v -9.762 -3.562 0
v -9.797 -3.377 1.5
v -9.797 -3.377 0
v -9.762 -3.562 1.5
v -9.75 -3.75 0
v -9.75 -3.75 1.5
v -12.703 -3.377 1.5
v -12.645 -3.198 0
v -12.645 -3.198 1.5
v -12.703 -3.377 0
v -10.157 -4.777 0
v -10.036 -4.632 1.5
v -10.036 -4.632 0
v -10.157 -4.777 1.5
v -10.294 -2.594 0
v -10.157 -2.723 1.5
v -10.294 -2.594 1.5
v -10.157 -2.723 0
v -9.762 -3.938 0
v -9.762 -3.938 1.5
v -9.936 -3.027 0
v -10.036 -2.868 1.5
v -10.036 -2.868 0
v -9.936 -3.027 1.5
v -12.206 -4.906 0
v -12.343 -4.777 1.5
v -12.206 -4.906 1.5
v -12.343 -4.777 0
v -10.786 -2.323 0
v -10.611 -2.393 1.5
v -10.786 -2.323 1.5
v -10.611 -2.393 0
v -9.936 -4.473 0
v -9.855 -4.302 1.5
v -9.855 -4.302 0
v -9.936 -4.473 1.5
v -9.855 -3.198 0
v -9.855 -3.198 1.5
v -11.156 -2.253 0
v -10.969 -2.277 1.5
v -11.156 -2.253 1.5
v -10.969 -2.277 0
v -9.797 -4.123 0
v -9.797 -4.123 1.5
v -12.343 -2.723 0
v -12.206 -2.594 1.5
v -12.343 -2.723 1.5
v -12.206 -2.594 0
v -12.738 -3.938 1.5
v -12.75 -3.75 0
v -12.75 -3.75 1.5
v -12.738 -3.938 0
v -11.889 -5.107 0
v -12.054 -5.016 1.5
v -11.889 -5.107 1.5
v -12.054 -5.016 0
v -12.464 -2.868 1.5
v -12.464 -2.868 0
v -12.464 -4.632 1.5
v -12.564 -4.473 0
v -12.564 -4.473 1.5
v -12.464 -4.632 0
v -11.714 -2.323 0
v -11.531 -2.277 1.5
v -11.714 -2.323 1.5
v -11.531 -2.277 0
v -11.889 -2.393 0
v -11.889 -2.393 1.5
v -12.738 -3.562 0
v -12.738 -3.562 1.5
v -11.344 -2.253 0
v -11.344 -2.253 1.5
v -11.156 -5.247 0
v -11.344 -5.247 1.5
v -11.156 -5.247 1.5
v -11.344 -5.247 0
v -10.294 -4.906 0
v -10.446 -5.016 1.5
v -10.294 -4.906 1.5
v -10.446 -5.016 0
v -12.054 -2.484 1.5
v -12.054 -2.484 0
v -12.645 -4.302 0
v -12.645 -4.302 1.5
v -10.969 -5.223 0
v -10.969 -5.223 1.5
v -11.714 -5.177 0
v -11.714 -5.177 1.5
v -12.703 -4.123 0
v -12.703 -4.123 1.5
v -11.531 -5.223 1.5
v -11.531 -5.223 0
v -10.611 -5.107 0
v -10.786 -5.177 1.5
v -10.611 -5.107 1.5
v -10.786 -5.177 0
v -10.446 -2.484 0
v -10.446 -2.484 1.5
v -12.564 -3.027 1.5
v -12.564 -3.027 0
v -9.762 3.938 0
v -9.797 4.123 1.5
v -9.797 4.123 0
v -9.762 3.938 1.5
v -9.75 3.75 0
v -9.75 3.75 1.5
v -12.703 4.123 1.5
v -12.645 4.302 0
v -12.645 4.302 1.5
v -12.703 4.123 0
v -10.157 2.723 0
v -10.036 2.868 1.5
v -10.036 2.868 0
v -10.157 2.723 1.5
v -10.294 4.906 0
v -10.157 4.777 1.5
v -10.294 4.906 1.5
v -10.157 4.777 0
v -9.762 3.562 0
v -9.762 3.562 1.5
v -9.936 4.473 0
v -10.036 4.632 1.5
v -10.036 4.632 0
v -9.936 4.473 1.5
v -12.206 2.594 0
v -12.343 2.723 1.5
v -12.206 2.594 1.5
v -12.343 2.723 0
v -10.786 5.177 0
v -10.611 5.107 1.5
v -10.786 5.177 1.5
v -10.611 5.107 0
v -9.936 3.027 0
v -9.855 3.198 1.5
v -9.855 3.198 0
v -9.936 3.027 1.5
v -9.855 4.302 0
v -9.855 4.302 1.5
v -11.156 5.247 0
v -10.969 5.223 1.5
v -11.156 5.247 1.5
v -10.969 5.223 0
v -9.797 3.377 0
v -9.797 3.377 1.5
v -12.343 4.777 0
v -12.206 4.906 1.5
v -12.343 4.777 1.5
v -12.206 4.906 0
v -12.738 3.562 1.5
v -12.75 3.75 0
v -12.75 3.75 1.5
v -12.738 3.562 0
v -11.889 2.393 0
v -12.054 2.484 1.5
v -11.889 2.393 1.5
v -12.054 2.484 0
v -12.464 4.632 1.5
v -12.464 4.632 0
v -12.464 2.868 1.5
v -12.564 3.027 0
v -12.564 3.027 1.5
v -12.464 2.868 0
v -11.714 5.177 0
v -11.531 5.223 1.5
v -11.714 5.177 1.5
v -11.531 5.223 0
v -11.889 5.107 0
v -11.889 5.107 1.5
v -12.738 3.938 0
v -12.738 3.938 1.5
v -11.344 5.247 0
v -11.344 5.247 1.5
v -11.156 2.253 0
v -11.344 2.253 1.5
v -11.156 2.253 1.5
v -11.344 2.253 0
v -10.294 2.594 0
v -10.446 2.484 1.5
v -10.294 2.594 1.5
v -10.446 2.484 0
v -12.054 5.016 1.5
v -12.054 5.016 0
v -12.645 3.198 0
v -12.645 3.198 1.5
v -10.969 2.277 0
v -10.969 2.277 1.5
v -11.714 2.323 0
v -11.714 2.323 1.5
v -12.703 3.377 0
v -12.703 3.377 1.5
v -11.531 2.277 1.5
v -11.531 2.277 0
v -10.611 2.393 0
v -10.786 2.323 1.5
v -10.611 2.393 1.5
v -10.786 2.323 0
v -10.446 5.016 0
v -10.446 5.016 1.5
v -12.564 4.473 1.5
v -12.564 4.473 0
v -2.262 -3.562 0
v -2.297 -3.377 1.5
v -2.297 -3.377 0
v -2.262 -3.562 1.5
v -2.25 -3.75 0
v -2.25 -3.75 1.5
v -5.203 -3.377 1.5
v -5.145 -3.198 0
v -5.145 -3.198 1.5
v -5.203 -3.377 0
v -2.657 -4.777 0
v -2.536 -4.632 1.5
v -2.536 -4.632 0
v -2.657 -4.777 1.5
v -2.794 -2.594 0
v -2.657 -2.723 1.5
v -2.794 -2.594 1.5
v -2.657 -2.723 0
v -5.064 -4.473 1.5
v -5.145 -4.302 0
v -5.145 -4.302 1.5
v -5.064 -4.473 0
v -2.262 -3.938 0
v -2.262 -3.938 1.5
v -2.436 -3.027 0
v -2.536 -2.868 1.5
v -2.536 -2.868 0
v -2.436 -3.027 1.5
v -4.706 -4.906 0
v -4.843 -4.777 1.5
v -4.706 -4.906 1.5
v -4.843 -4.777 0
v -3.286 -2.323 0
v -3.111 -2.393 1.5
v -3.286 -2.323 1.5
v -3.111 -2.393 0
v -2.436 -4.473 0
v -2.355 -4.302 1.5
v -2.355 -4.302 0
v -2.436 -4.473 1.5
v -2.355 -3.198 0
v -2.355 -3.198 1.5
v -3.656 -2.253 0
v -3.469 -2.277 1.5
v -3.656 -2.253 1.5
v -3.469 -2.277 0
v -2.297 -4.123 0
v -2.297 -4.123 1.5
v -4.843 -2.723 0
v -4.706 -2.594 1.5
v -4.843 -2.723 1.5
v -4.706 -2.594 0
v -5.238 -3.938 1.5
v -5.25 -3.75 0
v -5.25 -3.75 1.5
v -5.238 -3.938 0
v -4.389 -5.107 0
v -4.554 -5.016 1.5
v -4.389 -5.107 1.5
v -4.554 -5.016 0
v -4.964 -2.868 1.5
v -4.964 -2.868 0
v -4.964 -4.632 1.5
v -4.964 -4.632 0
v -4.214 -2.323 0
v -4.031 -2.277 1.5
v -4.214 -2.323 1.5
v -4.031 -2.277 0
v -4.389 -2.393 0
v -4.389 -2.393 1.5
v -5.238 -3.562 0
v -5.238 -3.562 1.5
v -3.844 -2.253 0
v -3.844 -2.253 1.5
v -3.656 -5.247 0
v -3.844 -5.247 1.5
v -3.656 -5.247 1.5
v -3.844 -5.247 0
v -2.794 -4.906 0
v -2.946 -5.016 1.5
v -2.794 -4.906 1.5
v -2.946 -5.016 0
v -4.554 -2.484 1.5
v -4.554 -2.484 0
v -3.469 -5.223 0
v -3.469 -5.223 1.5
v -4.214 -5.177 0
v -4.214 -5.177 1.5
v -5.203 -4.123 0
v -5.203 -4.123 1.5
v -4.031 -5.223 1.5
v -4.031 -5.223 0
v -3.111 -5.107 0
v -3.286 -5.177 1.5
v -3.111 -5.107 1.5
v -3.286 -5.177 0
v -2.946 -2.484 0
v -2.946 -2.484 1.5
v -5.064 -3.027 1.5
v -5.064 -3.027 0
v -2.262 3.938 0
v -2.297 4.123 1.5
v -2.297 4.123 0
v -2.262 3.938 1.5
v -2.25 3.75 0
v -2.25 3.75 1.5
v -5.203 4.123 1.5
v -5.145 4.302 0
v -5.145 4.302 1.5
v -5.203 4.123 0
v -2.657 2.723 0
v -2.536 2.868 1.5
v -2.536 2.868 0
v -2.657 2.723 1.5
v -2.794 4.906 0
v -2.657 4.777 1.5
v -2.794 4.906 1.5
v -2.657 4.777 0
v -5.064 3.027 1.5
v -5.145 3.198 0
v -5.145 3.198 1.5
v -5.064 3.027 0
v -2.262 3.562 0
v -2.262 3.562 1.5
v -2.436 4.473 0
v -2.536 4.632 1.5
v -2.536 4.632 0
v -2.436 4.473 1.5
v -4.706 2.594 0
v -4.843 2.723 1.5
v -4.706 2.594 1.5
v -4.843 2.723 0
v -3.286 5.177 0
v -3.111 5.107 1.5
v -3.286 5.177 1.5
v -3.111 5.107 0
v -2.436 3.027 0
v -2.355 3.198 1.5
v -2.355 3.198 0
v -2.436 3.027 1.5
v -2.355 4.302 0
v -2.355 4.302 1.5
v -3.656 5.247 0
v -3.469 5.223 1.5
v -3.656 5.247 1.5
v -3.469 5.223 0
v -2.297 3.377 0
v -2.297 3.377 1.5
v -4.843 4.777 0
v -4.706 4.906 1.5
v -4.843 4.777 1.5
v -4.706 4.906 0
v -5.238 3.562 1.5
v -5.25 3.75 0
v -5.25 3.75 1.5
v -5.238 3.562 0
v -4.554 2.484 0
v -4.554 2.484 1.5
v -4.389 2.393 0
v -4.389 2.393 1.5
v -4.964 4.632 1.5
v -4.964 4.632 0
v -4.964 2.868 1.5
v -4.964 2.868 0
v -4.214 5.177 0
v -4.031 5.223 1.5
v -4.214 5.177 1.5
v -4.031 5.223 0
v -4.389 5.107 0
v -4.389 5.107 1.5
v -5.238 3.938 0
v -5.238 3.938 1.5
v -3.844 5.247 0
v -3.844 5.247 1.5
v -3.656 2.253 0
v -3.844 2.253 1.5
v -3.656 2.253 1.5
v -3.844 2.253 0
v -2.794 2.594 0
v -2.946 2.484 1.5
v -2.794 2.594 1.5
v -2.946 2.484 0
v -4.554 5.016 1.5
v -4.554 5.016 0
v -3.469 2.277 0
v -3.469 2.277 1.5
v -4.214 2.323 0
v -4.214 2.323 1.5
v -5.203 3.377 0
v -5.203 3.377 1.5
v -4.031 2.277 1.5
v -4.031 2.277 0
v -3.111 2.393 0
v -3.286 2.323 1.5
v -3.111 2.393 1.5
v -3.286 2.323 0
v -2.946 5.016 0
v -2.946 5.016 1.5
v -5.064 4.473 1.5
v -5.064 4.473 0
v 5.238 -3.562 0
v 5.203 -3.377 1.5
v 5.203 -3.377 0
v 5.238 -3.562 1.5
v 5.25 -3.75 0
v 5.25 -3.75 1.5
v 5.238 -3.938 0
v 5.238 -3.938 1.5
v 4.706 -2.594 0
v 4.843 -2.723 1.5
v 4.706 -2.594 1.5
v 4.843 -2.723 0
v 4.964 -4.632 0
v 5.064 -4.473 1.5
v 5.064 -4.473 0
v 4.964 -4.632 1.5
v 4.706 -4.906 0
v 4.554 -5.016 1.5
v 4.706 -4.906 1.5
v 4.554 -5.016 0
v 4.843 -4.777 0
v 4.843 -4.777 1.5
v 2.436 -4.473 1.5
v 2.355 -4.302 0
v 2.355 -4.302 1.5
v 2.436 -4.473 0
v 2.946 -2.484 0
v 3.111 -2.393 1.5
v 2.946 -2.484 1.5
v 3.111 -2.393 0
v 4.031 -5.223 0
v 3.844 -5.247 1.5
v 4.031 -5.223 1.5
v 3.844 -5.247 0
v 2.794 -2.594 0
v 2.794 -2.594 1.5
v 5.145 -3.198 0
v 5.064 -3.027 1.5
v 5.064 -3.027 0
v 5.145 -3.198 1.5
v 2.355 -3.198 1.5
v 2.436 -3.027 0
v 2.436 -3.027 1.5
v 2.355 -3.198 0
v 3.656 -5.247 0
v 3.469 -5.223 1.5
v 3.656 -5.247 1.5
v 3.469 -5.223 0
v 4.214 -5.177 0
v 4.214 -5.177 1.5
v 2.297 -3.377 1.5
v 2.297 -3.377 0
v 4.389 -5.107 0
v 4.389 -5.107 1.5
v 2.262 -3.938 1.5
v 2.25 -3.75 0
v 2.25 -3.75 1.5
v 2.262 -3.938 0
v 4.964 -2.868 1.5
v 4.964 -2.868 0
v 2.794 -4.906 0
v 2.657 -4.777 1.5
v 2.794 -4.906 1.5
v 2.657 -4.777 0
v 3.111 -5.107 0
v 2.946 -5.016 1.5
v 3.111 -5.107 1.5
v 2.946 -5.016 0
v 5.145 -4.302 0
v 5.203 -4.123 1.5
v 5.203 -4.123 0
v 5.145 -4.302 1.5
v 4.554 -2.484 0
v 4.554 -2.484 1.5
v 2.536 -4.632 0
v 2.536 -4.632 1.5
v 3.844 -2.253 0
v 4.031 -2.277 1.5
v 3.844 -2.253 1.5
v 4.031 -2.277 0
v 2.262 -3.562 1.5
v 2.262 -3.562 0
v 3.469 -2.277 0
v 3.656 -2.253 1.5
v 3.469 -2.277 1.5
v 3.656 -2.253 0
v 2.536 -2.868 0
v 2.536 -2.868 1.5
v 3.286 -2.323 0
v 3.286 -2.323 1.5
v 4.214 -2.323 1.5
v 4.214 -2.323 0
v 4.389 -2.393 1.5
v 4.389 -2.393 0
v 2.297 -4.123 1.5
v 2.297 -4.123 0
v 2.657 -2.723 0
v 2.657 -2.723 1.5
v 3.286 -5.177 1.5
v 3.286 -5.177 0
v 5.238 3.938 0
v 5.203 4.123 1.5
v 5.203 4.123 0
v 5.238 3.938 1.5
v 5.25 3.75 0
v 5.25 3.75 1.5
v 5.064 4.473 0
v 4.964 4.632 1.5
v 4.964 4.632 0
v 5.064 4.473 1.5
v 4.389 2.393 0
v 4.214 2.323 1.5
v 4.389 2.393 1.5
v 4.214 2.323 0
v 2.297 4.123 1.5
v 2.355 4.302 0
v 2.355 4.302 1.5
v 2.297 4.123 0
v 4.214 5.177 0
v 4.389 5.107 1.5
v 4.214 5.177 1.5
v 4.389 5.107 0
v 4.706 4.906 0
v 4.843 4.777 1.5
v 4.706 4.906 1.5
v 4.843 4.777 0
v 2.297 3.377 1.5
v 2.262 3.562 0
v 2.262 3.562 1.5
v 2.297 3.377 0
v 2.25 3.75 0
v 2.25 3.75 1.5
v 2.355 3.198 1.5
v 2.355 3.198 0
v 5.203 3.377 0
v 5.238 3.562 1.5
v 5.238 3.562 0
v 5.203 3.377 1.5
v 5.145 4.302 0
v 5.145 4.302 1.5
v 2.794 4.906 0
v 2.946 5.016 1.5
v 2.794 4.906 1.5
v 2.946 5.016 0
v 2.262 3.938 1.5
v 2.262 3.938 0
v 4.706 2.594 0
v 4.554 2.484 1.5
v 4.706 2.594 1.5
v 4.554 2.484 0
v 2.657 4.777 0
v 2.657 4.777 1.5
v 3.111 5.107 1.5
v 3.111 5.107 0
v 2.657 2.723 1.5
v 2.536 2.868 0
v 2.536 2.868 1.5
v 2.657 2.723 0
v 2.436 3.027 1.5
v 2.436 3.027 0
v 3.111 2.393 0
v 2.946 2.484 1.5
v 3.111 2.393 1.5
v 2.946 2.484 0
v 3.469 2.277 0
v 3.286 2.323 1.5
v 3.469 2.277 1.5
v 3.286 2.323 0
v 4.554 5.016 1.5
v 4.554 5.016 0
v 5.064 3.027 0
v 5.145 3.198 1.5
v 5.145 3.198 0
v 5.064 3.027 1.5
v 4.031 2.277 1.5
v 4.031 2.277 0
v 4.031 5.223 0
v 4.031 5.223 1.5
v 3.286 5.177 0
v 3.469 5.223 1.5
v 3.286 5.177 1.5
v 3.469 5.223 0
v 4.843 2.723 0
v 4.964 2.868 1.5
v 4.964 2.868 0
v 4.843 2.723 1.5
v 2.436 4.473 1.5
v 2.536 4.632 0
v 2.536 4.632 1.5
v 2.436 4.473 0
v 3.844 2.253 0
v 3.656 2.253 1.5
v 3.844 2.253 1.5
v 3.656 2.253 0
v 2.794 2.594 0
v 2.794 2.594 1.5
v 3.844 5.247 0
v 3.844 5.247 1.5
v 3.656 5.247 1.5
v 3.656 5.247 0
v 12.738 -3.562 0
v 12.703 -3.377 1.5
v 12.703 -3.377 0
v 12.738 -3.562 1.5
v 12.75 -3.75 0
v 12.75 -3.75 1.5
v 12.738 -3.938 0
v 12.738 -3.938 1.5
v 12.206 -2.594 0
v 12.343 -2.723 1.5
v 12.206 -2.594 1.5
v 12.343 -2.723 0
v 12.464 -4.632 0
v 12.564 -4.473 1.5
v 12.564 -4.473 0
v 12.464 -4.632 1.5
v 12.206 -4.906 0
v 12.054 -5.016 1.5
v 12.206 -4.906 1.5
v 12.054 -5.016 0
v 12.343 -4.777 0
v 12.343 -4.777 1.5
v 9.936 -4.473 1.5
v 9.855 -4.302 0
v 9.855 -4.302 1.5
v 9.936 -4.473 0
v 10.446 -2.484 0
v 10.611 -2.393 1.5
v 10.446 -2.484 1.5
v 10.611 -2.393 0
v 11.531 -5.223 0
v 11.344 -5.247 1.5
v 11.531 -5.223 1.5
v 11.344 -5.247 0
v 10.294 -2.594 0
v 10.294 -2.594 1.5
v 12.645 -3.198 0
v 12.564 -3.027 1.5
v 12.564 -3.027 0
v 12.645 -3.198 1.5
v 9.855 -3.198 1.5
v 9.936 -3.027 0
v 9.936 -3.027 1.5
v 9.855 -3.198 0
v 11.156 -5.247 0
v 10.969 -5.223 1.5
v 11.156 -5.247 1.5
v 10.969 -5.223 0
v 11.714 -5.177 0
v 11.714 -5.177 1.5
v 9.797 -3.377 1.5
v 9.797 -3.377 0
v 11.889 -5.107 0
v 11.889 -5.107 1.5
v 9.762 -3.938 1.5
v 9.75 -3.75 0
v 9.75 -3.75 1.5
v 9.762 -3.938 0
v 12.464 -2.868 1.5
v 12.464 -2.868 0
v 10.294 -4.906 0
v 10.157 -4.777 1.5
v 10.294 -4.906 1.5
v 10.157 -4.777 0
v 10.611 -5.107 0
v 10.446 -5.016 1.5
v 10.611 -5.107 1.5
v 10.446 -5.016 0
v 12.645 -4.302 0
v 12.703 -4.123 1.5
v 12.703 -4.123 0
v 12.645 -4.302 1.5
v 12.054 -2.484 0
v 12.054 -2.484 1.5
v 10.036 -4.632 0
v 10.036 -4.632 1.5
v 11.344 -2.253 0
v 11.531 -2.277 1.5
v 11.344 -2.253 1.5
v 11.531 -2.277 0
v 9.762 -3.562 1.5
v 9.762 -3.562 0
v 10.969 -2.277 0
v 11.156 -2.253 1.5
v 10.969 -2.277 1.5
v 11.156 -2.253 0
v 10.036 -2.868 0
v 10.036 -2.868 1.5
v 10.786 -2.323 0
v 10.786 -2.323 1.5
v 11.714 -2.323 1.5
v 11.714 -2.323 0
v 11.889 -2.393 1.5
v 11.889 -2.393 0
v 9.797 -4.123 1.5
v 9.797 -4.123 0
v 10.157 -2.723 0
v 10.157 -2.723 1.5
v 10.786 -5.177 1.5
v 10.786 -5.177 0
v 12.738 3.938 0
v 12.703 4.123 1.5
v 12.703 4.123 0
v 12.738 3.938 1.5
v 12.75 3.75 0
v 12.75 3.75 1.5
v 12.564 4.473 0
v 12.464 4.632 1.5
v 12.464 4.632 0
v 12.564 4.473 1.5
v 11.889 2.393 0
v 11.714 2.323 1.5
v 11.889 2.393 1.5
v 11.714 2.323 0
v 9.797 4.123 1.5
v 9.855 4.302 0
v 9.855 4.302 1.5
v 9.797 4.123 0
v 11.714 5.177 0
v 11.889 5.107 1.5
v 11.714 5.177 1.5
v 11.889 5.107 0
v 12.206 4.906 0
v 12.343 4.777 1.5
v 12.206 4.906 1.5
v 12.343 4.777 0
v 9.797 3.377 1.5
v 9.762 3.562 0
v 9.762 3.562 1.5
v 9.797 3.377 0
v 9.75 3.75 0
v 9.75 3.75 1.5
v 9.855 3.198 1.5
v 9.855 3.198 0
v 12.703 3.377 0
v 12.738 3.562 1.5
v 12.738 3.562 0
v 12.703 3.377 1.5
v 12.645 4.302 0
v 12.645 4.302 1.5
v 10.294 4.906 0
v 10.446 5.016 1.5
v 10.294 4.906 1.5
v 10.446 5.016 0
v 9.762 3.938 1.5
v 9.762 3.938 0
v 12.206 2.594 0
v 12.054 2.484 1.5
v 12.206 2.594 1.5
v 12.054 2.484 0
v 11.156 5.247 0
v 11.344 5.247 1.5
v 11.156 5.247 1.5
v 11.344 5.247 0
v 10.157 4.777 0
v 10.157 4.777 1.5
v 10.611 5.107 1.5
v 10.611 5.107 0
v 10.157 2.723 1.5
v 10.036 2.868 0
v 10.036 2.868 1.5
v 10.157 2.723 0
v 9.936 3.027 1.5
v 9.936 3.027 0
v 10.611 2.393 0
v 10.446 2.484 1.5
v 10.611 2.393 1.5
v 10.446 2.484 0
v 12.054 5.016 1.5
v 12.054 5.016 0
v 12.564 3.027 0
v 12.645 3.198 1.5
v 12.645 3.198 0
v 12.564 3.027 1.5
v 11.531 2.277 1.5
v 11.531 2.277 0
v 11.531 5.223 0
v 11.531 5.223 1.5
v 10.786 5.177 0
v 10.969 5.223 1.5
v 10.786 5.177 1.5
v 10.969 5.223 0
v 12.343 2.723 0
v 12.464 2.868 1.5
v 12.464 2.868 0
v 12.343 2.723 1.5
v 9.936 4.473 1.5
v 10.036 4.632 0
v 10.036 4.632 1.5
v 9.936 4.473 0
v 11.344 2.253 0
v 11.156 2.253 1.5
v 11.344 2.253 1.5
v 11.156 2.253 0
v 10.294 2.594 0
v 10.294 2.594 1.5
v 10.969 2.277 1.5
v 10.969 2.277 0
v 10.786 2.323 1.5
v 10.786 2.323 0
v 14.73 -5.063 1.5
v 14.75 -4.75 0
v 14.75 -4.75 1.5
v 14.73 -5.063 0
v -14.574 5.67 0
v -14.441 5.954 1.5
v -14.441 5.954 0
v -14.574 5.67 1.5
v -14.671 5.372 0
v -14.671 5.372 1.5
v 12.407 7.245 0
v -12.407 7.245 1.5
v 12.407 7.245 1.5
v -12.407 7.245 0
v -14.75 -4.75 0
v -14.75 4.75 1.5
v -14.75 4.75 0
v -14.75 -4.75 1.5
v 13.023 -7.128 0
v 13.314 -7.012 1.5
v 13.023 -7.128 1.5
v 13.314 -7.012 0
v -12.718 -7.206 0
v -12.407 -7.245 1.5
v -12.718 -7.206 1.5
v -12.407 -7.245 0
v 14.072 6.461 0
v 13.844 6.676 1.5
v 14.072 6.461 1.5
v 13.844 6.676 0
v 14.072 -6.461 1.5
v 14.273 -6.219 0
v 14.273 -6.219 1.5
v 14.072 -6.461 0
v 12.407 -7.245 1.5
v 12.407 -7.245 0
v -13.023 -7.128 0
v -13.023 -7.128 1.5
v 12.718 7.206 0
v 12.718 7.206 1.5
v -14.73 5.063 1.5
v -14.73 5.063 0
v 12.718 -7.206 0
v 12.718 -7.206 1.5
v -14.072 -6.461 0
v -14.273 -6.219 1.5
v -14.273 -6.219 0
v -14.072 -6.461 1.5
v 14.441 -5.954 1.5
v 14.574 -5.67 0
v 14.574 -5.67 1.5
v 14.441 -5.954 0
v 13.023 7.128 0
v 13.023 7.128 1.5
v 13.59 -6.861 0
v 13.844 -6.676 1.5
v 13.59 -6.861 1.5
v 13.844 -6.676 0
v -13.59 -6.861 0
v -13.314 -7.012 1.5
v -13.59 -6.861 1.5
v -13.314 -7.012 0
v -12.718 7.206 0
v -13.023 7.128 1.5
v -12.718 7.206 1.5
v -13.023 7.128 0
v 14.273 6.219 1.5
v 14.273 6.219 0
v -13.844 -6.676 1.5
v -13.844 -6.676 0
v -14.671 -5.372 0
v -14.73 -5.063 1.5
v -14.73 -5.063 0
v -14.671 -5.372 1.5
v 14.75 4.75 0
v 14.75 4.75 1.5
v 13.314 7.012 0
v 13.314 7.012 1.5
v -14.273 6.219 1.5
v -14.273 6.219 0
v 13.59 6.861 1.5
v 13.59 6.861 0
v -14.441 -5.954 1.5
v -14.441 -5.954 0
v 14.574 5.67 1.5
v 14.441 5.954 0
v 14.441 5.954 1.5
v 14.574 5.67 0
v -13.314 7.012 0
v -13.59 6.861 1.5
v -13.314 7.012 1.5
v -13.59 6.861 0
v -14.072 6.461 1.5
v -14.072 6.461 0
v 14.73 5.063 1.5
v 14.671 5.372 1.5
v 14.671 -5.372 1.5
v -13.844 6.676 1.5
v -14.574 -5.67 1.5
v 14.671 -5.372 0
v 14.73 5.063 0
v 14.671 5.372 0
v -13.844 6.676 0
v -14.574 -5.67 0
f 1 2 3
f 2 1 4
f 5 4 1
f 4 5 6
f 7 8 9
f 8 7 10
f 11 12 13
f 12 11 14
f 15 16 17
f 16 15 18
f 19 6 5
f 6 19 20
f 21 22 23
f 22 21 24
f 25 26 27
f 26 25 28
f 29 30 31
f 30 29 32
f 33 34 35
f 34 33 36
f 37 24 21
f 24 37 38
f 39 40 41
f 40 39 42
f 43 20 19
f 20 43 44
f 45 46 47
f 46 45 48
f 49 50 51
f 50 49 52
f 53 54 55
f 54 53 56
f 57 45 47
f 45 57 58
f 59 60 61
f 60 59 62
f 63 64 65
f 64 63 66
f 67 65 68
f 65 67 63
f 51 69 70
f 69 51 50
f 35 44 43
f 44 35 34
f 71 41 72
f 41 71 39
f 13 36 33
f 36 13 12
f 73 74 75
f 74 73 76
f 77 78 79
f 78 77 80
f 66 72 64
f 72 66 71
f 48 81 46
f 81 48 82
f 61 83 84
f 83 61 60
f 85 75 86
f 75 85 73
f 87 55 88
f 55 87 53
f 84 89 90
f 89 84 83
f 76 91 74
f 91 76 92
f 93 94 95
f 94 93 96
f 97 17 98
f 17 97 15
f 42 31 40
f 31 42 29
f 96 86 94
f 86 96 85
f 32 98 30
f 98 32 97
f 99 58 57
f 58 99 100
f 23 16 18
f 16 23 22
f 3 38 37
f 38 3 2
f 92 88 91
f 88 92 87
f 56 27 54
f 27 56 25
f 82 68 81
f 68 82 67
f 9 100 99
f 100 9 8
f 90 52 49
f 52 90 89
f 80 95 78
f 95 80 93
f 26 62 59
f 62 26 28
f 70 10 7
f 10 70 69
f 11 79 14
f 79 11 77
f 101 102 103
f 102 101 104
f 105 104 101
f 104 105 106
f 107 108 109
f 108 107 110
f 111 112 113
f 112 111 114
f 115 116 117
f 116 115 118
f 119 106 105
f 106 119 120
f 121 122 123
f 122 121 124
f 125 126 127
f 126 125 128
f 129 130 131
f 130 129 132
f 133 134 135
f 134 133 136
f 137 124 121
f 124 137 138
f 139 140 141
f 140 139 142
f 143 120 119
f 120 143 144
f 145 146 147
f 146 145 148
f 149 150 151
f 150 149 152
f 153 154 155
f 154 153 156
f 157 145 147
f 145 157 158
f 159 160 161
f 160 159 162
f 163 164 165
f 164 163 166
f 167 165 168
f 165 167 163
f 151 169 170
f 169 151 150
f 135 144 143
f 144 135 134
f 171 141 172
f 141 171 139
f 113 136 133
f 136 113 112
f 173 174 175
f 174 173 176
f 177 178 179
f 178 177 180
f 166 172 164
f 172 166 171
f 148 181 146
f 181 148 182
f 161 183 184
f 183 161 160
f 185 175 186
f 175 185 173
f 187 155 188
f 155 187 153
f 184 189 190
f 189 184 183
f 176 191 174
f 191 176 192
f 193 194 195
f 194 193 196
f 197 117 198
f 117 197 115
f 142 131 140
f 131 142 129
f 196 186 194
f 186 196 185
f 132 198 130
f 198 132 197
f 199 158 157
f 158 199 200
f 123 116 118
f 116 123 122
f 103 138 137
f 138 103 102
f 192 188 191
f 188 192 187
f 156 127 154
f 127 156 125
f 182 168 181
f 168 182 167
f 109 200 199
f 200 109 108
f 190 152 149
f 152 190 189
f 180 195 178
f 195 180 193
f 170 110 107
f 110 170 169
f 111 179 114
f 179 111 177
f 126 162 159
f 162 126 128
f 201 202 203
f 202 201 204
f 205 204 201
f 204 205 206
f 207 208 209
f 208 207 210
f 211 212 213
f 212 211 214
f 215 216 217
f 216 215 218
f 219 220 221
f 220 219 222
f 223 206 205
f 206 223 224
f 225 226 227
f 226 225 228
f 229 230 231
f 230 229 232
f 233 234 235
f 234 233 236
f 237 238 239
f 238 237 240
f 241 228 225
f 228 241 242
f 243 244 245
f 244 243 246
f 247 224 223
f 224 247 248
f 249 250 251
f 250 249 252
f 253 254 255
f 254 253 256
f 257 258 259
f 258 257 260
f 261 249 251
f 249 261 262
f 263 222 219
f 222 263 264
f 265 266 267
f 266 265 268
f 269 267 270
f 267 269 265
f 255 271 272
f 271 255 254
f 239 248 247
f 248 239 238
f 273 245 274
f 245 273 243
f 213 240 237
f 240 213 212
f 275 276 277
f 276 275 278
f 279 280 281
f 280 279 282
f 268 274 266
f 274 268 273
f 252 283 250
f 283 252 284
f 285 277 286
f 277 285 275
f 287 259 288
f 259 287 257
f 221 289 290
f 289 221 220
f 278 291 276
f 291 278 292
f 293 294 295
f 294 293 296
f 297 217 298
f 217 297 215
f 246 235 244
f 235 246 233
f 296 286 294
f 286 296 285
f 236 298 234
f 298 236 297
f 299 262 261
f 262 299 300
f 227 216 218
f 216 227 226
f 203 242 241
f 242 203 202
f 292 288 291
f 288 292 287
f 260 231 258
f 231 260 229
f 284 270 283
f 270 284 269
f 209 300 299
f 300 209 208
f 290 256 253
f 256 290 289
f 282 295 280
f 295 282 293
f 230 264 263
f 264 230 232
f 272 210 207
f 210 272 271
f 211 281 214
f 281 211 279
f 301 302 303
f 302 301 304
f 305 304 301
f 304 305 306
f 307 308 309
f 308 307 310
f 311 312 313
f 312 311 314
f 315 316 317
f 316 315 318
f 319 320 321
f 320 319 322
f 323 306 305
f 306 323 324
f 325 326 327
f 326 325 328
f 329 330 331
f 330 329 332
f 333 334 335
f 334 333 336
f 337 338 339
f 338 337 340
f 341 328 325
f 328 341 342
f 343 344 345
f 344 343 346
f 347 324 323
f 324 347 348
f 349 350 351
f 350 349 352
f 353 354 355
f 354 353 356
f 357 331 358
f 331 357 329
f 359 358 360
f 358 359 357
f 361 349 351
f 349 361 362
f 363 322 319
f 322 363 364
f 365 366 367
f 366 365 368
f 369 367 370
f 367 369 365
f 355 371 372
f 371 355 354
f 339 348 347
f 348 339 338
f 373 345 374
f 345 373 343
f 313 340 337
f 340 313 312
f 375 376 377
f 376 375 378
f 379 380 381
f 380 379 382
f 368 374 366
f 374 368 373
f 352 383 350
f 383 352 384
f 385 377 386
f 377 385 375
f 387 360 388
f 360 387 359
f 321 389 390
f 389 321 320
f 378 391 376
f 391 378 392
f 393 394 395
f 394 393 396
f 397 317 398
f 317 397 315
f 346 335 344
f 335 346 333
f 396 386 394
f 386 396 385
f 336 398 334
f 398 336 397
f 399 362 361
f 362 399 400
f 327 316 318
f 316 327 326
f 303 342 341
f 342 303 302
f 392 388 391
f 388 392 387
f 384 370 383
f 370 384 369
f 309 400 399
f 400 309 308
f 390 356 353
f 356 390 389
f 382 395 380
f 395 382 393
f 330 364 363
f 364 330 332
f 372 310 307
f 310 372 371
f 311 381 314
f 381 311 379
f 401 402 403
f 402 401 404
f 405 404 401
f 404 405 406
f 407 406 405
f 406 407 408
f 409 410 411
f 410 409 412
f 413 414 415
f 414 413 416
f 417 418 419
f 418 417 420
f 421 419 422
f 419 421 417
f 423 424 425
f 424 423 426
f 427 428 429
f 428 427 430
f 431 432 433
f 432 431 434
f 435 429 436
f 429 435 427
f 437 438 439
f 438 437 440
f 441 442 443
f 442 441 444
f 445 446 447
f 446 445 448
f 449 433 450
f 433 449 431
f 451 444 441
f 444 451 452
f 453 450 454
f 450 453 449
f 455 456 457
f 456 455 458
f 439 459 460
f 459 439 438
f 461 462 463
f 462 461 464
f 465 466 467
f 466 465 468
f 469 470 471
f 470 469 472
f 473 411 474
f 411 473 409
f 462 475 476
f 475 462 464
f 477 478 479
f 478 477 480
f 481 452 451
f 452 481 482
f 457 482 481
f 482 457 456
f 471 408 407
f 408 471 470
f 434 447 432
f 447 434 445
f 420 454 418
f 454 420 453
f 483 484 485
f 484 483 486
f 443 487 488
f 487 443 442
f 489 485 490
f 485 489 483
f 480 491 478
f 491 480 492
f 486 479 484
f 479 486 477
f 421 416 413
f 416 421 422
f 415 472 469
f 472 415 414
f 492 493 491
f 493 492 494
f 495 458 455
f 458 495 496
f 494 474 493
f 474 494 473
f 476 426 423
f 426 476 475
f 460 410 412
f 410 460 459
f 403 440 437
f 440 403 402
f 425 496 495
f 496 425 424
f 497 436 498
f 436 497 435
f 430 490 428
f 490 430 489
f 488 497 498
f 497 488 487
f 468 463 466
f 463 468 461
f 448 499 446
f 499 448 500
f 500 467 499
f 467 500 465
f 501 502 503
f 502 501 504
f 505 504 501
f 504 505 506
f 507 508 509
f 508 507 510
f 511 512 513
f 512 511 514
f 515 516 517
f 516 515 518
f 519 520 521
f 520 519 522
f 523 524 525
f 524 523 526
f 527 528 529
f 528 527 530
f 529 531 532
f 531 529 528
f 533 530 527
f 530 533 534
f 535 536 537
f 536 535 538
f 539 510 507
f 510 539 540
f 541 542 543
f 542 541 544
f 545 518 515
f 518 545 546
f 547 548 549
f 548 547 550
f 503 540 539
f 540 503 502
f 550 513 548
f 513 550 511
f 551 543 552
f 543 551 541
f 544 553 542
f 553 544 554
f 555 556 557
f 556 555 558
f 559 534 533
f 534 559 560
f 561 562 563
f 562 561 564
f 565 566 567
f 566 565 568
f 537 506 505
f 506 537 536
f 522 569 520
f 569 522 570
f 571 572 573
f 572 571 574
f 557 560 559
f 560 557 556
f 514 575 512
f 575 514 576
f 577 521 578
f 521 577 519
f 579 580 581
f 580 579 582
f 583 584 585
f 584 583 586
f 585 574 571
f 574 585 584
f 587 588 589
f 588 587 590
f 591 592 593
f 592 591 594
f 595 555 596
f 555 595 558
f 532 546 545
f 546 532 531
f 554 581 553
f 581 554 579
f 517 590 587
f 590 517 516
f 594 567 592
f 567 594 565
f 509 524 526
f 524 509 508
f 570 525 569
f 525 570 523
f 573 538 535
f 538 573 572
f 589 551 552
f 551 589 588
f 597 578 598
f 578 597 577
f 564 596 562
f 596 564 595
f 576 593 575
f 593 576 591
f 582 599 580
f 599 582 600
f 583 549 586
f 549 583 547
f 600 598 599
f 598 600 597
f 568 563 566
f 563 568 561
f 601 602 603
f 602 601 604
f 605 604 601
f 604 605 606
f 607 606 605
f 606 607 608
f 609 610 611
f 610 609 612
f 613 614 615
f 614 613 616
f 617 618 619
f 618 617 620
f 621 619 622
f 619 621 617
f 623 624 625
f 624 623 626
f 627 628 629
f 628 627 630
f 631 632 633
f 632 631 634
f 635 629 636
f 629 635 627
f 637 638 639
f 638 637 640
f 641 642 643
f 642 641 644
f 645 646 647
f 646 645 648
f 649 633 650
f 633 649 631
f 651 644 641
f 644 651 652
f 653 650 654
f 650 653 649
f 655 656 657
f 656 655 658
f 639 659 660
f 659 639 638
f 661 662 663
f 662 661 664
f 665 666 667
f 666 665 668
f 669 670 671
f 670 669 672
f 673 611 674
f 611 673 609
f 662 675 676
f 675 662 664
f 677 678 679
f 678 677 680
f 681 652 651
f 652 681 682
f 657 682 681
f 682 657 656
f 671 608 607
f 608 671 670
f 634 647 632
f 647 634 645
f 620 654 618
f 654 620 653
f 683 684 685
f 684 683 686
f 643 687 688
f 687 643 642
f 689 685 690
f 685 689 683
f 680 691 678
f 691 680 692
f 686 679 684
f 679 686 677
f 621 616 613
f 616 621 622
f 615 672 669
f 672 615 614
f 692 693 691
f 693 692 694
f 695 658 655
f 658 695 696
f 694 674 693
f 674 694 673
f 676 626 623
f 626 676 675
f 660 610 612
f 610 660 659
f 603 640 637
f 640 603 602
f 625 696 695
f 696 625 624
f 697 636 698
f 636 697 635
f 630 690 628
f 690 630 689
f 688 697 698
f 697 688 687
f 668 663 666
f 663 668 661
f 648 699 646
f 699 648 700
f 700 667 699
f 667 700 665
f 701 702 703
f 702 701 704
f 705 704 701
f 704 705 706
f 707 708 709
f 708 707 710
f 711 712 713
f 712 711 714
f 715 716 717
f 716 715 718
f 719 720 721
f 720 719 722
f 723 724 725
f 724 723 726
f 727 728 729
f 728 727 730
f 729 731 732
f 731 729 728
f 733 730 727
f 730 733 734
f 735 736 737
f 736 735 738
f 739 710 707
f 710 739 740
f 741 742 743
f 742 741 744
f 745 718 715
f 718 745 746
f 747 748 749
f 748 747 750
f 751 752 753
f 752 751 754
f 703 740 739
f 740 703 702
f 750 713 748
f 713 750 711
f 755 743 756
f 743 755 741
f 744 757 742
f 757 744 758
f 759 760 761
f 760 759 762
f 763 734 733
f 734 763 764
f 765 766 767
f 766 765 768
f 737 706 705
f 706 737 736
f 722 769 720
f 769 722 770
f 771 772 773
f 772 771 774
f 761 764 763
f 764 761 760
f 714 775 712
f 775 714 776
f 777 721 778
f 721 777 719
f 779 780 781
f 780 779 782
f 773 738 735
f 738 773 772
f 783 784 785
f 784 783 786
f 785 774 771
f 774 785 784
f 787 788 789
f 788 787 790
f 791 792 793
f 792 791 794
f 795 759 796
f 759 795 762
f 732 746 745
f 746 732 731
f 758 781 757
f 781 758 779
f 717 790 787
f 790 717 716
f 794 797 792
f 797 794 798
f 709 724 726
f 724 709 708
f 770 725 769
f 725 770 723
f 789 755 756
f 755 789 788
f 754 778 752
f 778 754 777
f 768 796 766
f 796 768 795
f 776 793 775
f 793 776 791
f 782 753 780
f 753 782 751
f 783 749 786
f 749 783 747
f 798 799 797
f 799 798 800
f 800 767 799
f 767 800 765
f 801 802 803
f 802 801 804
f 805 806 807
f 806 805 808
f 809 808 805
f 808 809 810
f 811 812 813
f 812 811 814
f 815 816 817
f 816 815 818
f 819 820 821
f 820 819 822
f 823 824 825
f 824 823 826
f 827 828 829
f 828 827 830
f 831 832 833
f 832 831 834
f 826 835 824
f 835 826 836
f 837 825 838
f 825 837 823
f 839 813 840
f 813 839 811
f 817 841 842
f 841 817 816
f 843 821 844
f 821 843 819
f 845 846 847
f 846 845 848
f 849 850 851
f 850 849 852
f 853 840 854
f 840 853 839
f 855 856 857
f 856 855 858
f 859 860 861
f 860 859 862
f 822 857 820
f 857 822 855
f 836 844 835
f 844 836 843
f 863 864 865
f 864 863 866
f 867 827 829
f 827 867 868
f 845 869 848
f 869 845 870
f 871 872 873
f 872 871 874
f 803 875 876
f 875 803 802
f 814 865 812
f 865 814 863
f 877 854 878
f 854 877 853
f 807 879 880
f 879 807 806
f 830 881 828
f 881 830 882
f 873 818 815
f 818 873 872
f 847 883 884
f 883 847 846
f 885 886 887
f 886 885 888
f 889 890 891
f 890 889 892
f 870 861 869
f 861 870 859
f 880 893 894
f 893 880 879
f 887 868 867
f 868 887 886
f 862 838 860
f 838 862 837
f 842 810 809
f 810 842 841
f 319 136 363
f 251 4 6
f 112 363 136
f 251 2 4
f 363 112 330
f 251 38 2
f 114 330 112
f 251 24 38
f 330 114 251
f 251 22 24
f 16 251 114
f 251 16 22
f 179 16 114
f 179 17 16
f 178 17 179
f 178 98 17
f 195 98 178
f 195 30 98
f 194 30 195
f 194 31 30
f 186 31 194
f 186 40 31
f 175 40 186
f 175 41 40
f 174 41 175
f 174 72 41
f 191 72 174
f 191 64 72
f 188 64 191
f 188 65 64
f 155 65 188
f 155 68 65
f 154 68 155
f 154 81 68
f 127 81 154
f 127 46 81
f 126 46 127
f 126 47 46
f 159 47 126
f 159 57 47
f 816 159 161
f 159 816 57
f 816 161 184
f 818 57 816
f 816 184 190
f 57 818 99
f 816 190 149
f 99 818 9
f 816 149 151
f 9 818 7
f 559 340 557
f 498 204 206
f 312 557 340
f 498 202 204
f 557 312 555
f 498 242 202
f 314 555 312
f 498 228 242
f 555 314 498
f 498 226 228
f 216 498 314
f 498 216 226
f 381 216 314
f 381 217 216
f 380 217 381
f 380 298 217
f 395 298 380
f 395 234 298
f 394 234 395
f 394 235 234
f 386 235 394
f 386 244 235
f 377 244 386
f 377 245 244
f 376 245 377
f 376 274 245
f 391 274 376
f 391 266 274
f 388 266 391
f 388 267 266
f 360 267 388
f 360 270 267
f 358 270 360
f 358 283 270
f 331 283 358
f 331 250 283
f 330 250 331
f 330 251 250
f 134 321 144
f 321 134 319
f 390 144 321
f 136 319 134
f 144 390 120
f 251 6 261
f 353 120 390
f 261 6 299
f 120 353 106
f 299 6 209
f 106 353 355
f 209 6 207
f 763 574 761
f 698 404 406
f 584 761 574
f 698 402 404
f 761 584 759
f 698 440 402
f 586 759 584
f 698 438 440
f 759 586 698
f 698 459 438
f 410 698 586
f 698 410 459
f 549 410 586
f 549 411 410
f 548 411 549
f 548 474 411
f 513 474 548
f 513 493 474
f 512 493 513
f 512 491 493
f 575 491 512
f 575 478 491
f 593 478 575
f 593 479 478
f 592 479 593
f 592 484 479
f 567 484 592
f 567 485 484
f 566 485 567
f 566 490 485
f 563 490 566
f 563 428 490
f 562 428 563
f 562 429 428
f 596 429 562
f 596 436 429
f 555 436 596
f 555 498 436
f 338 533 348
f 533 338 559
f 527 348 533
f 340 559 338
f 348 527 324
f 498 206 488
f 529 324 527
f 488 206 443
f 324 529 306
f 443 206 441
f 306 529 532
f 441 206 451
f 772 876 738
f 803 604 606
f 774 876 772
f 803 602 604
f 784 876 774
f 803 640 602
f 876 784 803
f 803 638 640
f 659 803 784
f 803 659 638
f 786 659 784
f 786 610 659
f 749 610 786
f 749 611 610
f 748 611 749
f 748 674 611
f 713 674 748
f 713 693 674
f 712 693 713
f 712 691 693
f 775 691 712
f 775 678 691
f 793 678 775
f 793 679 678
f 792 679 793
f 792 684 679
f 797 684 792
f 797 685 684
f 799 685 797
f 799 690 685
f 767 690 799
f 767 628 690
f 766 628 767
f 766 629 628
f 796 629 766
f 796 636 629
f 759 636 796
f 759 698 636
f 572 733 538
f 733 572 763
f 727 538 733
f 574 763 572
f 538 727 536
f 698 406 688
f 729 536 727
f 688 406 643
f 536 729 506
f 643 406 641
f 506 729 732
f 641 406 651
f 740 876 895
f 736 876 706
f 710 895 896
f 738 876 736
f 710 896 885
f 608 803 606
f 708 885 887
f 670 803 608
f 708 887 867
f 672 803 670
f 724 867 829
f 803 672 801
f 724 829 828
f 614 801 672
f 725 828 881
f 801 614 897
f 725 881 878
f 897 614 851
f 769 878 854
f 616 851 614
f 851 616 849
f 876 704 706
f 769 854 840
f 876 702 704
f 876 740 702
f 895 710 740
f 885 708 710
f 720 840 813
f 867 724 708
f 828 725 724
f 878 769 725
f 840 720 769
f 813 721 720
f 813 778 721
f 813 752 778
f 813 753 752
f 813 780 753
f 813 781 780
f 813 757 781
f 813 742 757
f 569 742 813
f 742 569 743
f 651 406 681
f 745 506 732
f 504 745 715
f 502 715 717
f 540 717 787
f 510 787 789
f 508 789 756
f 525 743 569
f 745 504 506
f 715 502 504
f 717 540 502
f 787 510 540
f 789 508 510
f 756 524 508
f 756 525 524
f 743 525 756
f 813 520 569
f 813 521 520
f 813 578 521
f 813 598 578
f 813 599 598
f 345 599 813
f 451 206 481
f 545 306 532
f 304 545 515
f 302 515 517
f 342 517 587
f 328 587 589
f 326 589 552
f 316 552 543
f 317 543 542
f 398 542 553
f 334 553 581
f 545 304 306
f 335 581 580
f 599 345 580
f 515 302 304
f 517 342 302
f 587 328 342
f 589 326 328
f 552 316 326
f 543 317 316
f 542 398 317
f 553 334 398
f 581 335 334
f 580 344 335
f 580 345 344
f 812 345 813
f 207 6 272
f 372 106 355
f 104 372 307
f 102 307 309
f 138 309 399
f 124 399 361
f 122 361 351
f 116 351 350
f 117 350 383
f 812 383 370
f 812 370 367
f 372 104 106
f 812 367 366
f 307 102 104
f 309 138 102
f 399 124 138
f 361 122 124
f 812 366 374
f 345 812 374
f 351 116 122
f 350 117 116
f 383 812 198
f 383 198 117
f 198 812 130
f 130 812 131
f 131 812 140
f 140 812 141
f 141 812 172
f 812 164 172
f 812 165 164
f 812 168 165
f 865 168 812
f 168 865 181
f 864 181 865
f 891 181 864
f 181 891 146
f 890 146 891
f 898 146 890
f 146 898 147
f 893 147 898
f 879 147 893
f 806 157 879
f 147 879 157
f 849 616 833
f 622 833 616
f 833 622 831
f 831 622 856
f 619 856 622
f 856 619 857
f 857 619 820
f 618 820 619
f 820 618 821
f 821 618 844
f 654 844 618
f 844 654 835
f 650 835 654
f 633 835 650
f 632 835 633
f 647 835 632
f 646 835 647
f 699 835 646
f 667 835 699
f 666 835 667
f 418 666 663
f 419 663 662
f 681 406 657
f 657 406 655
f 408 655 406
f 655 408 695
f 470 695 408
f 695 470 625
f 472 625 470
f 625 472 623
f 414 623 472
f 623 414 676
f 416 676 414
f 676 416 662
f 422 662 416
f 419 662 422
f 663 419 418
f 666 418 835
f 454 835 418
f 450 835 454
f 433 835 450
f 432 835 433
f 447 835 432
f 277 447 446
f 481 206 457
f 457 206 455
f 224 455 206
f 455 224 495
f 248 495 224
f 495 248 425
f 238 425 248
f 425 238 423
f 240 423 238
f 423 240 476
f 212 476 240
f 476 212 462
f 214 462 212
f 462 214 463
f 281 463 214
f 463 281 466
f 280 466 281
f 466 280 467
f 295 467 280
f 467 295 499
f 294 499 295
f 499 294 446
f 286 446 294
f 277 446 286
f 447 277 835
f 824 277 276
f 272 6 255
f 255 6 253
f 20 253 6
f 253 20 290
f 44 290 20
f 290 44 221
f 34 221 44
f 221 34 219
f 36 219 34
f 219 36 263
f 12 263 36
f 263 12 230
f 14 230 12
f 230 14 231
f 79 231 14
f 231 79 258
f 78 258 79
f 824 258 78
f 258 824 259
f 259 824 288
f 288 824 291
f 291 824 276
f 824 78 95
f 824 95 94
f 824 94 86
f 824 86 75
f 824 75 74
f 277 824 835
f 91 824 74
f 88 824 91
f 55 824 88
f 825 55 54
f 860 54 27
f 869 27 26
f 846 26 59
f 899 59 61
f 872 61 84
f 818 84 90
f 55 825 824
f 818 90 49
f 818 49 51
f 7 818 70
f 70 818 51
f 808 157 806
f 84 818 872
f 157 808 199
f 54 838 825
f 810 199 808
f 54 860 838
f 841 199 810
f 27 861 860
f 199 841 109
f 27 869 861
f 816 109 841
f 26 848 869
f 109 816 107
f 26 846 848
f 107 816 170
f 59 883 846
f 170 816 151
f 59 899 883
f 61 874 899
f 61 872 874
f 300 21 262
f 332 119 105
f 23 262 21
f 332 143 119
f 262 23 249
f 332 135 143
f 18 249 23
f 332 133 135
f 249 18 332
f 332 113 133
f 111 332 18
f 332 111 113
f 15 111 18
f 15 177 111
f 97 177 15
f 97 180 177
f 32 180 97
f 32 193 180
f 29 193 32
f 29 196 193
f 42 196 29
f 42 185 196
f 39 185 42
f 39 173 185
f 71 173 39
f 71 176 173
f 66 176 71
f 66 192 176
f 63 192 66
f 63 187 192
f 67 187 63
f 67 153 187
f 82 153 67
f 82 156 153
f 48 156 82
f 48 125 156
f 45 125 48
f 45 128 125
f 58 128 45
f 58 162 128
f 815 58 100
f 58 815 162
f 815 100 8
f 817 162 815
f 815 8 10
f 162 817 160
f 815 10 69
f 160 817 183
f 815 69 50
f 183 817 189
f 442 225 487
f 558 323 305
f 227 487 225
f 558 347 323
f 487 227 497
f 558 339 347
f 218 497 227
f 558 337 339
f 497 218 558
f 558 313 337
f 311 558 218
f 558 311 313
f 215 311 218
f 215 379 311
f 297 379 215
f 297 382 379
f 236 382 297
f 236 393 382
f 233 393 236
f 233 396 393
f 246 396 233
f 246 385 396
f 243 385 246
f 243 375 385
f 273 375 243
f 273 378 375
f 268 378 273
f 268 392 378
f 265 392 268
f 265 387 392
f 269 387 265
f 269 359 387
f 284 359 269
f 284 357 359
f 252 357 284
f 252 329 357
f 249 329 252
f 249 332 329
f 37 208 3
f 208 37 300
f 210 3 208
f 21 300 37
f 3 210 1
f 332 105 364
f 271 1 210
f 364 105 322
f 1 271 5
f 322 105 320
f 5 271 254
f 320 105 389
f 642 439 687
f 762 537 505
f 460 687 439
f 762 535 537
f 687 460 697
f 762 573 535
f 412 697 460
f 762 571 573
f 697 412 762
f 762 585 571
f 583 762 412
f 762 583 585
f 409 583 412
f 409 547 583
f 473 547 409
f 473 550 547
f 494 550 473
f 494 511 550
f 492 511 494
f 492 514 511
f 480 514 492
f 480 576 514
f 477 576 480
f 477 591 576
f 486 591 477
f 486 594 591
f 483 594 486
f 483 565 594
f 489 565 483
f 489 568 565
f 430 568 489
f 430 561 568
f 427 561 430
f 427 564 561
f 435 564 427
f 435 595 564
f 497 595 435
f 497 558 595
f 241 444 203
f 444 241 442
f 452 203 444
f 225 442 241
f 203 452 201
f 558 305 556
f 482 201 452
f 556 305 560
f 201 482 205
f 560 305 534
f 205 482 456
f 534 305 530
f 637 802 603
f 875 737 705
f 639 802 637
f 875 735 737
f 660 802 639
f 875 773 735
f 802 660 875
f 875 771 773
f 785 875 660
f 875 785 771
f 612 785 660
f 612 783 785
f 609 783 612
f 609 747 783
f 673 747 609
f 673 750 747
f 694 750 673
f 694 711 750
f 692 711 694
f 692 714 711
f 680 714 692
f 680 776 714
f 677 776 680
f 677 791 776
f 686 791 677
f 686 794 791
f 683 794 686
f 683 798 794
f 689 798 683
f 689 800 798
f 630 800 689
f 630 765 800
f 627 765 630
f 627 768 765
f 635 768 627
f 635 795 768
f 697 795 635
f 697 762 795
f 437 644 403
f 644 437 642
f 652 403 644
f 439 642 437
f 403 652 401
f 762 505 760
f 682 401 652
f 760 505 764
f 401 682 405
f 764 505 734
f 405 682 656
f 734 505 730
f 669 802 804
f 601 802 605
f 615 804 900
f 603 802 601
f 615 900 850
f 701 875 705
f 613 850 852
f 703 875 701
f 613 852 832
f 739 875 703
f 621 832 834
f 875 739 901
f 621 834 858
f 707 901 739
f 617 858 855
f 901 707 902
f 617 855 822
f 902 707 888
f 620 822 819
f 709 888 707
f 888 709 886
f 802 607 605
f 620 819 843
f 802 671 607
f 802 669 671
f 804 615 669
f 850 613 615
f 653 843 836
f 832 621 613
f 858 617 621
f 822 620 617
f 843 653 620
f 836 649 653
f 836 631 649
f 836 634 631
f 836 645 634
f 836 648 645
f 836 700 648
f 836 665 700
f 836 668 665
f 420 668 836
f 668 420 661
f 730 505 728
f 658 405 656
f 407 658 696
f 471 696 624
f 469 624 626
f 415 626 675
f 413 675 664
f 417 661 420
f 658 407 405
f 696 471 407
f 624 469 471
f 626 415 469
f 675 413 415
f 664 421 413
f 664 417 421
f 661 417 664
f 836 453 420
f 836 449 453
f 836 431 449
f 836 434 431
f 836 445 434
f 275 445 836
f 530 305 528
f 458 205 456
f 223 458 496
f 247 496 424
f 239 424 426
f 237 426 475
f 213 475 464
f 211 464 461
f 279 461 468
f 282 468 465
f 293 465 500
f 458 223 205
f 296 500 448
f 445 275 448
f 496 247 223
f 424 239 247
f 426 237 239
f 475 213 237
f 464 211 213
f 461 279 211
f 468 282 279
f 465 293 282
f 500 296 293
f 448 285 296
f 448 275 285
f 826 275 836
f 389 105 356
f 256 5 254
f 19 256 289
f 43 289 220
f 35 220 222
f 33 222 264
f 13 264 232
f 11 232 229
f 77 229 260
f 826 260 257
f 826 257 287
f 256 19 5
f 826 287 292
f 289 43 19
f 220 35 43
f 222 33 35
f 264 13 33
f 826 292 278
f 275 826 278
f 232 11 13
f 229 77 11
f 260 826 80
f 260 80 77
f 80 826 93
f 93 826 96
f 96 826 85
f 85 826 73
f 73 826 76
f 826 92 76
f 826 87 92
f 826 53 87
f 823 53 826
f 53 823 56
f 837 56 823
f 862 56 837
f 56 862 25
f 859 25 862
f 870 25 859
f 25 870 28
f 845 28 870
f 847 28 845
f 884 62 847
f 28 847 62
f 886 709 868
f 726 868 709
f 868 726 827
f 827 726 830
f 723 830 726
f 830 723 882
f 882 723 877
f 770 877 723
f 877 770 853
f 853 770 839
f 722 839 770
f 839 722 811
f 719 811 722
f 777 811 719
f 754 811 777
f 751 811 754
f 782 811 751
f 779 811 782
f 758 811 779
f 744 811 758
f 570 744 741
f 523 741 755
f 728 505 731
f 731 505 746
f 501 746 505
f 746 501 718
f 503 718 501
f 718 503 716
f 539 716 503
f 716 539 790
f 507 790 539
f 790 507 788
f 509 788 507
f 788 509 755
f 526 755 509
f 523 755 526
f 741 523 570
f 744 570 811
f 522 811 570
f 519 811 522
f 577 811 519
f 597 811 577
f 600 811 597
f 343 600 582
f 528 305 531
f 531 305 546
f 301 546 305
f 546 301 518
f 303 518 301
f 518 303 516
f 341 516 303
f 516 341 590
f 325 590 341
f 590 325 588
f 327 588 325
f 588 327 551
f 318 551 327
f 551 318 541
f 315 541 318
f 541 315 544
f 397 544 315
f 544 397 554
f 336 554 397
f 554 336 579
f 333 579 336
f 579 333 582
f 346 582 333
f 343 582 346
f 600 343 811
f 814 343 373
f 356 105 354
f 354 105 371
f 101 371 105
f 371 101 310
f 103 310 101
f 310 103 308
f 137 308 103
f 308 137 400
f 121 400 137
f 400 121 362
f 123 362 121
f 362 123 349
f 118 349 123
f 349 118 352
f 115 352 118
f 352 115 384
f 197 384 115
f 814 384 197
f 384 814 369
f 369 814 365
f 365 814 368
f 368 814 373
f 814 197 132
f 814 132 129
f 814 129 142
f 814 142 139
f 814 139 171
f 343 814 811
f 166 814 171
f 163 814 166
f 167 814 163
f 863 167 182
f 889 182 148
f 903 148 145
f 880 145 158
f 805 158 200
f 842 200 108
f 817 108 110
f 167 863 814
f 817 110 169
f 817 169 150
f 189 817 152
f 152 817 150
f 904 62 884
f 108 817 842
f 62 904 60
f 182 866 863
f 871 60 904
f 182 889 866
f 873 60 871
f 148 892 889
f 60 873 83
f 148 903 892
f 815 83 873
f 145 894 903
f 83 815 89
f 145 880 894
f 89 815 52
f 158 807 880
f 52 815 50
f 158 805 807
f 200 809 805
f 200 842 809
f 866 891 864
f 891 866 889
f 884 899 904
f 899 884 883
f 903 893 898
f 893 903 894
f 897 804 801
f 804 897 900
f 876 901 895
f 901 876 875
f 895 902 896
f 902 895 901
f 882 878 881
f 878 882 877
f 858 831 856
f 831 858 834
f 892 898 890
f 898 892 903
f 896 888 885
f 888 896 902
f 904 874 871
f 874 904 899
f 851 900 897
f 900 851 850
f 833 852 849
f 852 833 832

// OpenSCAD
$fn = 50;


difference() {
	union() {
		translate(v = [0, 0, 0]) {
			rotate(a = [0, 0, 0]) {
				hull() {
					translate(v = [-12.2500000000, 4.7500000000, 0]) {
						rotate(a = [0, 0, 0]) {
							translate(v = [0, 0, 0]) {
								rotate(a = [0, 0, 0]) {
									cylinder(h = 1.5000000000, r = 2.5000000000);
								}
							}
						}
					}
					translate(v = [12.2500000000, 4.7500000000, 0]) {
						rotate(a = [0, 0, 0]) {
							translate(v = [0, 0, 0]) {
								rotate(a = [0, 0, 0]) {
									cylinder(h = 1.5000000000, r = 2.5000000000);
								}
							}
						}
					}
					translate(v = [-12.2500000000, -4.7500000000, 0]) {
						rotate(a = [0, 0, 0]) {
							translate(v = [0, 0, 0]) {
								rotate(a = [0, 0, 0]) {
									cylinder(h = 1.5000000000, r = 2.5000000000);
								}
							}
						}
					}
					translate(v = [12.2500000000, -4.7500000000, 0]) {
						rotate(a = [0, 0, 0]) {
							translate(v = [0, 0, 0]) {
								rotate(a = [0, 0, 0]) {
									cylinder(h = 1.5000000000, r = 2.5000000000);
								}
							}
						}
					}
				}
			}
		}
	}
	union() {
		translate(v = [-11.2500000000, -3.7500000000, 0]) {
			rotate(a = [0, 0, 0]) {
				translate(v = [0, 0, -50]) {
					rotate(a = [0, 0, 0]) {
						cylinder(h = 100, r = 1.5000000000);
					}
				}
			}
		}
		translate(v = [-11.2500000000, 3.7500000000, 0]) {
			rotate(a = [0, 0, 0]) {
				translate(v = [0, 0, -50]) {
					rotate(a = [0, 0, 0]) {
						cylinder(h = 100, r = 1.5000000000);
					}
				}
			}
		}
		translate(v = [-3.7500000000, -3.7500000000, 0]) {
			rotate(a = [0, 0, 0]) {
				translate(v = [0, 0, -50]) {
					rotate(a = [0, 0, 0]) {
						cylinder(h = 100, r = 1.5000000000);
					}
				}
			}
		}
		translate(v = [-3.7500000000, 3.7500000000, 0]) {
			rotate(a = [0, 0, 0]) {
				translate(v = [0, 0, -50]) {
					rotate(a = [0, 0, 0]) {
						cylinder(h = 100, r = 1.5000000000);
					}
				}
			}
		}
		translate(v = [3.7500000000, -3.7500000000, 0]) {
			rotate(a = [0, 0, 0]) {
				translate(v = [0, 0, -50]) {
					rotate(a = [0, 0, 0]) {
						cylinder(h = 100, r = 1.5000000000);
					}
				}
			}
		}
		translate(v = [3.7500000000, 3.7500000000, 0]) {
			rotate(a = [0, 0, 0]) {
				translate(v = [0, 0, -50]) {
					rotate(a = [0, 0, 0]) {
						cylinder(h = 100, r = 1.5000000000);
					}
				}
			}
		}
		translate(v = [11.2500000000, -3.7500000000, 0]) {
			rotate(a = [0, 0, 0]) {
				translate(v = [0, 0, -50]) {
					rotate(a = [0, 0, 0]) {
						cylinder(h = 100, r = 1.5000000000);
					}
				}
			}
		}
		translate(v = [11.2500000000, 3.7500000000, 0]) {
			rotate(a = [0, 0, 0]) {
				translate(v = [0, 0, -50]) {
					rotate(a = [0, 0, 0]) {
						cylinder(h = 100, r = 1.5000000000);
					}
				}
			}
		}
	}
}
